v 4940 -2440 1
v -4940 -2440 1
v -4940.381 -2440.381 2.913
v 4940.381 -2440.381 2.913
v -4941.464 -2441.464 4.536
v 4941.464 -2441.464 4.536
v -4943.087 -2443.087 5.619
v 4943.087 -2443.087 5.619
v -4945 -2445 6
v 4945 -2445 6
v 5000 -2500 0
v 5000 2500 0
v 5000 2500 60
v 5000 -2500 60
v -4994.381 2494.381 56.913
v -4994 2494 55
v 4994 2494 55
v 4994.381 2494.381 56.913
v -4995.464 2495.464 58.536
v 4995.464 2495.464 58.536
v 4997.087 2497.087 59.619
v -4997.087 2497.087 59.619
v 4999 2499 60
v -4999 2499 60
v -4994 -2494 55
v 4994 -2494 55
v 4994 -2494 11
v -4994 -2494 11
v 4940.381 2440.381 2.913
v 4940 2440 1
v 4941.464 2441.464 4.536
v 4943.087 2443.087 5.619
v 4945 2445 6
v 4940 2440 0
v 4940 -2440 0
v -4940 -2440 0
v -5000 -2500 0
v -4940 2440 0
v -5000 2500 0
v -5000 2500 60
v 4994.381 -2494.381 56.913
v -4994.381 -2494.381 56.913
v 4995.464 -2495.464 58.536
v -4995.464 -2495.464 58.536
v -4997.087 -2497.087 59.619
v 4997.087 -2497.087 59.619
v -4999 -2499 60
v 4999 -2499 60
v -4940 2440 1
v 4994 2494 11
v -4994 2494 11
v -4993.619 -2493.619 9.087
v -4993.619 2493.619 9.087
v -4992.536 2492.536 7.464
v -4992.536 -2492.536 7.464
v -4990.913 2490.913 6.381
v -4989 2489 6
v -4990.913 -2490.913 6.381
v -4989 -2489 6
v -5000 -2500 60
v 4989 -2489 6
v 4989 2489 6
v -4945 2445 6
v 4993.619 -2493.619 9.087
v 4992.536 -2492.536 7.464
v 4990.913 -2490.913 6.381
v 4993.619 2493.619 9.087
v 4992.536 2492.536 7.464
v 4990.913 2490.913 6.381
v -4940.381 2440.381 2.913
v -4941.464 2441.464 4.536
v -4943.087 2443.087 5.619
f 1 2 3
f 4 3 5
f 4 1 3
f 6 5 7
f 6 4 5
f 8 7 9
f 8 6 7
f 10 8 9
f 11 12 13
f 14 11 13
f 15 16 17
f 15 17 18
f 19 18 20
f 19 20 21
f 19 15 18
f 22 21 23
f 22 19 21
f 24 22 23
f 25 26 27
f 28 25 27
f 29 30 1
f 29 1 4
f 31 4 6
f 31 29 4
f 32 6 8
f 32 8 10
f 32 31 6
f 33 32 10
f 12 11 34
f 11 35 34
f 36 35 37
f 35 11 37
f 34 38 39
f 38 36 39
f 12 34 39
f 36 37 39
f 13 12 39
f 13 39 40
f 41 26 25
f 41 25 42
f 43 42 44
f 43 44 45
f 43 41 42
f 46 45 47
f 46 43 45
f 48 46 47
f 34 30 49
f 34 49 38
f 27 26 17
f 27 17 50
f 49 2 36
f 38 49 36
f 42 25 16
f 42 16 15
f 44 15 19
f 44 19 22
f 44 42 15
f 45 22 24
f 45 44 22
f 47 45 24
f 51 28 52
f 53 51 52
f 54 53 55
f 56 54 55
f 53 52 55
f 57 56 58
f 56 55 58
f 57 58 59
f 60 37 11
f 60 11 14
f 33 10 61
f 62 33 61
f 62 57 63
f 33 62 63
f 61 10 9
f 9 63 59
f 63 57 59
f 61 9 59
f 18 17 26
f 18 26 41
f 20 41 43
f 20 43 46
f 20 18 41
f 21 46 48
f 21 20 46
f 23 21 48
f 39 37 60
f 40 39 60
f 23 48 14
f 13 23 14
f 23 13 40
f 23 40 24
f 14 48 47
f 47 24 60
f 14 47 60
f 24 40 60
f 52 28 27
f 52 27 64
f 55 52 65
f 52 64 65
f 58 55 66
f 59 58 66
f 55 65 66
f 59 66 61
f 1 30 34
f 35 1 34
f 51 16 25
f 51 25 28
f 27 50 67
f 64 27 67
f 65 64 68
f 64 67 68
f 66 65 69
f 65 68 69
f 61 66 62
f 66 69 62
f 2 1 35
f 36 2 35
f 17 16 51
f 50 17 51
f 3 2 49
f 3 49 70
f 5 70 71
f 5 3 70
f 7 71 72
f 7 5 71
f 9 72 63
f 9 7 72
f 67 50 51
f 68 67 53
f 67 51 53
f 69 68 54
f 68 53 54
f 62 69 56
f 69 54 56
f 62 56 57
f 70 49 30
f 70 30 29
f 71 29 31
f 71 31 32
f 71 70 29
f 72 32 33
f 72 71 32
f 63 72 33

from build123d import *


with BuildPart() as f2:
    # F2: sweep along a path in F0
    with BuildLine(Plane.XY) as f2_path:
        Line((5000, 2500), (-5000, 2500))
        Line((-5000, 2500), (-5000, -2500))
        Line((-5000, -2500), (5000, -2500))
        Line((5000, -2500), (5000, 2500))
    # F1 (on Right) → F2 (sweep)
    with BuildSketch(Plane.YZ):
        with BuildLine():
            Line((2440, 0), (2500, 0))
            Line((2500, 0), (2500, 60))
            Line((2500, 60), (2499, 60))
            ThreePointArc((2499, 60), (2495.4644660941, 58.5355339059), (2494, 55))
            Line((2494, 55), (2494, 11))
            ThreePointArc((2494, 11), (2492.5355339059, 7.4644660941), (2489, 6))
            Line((2489, 6), (2445, 6))
            ThreePointArc((2445, 6), (2441.4644660941, 4.5355339059), (2440, 1))
            Line((2440, 1), (2440, 0))
        make_face()
    sweep(path=f2_path.line, transition=Transition.RIGHT)


solid = f2.part
